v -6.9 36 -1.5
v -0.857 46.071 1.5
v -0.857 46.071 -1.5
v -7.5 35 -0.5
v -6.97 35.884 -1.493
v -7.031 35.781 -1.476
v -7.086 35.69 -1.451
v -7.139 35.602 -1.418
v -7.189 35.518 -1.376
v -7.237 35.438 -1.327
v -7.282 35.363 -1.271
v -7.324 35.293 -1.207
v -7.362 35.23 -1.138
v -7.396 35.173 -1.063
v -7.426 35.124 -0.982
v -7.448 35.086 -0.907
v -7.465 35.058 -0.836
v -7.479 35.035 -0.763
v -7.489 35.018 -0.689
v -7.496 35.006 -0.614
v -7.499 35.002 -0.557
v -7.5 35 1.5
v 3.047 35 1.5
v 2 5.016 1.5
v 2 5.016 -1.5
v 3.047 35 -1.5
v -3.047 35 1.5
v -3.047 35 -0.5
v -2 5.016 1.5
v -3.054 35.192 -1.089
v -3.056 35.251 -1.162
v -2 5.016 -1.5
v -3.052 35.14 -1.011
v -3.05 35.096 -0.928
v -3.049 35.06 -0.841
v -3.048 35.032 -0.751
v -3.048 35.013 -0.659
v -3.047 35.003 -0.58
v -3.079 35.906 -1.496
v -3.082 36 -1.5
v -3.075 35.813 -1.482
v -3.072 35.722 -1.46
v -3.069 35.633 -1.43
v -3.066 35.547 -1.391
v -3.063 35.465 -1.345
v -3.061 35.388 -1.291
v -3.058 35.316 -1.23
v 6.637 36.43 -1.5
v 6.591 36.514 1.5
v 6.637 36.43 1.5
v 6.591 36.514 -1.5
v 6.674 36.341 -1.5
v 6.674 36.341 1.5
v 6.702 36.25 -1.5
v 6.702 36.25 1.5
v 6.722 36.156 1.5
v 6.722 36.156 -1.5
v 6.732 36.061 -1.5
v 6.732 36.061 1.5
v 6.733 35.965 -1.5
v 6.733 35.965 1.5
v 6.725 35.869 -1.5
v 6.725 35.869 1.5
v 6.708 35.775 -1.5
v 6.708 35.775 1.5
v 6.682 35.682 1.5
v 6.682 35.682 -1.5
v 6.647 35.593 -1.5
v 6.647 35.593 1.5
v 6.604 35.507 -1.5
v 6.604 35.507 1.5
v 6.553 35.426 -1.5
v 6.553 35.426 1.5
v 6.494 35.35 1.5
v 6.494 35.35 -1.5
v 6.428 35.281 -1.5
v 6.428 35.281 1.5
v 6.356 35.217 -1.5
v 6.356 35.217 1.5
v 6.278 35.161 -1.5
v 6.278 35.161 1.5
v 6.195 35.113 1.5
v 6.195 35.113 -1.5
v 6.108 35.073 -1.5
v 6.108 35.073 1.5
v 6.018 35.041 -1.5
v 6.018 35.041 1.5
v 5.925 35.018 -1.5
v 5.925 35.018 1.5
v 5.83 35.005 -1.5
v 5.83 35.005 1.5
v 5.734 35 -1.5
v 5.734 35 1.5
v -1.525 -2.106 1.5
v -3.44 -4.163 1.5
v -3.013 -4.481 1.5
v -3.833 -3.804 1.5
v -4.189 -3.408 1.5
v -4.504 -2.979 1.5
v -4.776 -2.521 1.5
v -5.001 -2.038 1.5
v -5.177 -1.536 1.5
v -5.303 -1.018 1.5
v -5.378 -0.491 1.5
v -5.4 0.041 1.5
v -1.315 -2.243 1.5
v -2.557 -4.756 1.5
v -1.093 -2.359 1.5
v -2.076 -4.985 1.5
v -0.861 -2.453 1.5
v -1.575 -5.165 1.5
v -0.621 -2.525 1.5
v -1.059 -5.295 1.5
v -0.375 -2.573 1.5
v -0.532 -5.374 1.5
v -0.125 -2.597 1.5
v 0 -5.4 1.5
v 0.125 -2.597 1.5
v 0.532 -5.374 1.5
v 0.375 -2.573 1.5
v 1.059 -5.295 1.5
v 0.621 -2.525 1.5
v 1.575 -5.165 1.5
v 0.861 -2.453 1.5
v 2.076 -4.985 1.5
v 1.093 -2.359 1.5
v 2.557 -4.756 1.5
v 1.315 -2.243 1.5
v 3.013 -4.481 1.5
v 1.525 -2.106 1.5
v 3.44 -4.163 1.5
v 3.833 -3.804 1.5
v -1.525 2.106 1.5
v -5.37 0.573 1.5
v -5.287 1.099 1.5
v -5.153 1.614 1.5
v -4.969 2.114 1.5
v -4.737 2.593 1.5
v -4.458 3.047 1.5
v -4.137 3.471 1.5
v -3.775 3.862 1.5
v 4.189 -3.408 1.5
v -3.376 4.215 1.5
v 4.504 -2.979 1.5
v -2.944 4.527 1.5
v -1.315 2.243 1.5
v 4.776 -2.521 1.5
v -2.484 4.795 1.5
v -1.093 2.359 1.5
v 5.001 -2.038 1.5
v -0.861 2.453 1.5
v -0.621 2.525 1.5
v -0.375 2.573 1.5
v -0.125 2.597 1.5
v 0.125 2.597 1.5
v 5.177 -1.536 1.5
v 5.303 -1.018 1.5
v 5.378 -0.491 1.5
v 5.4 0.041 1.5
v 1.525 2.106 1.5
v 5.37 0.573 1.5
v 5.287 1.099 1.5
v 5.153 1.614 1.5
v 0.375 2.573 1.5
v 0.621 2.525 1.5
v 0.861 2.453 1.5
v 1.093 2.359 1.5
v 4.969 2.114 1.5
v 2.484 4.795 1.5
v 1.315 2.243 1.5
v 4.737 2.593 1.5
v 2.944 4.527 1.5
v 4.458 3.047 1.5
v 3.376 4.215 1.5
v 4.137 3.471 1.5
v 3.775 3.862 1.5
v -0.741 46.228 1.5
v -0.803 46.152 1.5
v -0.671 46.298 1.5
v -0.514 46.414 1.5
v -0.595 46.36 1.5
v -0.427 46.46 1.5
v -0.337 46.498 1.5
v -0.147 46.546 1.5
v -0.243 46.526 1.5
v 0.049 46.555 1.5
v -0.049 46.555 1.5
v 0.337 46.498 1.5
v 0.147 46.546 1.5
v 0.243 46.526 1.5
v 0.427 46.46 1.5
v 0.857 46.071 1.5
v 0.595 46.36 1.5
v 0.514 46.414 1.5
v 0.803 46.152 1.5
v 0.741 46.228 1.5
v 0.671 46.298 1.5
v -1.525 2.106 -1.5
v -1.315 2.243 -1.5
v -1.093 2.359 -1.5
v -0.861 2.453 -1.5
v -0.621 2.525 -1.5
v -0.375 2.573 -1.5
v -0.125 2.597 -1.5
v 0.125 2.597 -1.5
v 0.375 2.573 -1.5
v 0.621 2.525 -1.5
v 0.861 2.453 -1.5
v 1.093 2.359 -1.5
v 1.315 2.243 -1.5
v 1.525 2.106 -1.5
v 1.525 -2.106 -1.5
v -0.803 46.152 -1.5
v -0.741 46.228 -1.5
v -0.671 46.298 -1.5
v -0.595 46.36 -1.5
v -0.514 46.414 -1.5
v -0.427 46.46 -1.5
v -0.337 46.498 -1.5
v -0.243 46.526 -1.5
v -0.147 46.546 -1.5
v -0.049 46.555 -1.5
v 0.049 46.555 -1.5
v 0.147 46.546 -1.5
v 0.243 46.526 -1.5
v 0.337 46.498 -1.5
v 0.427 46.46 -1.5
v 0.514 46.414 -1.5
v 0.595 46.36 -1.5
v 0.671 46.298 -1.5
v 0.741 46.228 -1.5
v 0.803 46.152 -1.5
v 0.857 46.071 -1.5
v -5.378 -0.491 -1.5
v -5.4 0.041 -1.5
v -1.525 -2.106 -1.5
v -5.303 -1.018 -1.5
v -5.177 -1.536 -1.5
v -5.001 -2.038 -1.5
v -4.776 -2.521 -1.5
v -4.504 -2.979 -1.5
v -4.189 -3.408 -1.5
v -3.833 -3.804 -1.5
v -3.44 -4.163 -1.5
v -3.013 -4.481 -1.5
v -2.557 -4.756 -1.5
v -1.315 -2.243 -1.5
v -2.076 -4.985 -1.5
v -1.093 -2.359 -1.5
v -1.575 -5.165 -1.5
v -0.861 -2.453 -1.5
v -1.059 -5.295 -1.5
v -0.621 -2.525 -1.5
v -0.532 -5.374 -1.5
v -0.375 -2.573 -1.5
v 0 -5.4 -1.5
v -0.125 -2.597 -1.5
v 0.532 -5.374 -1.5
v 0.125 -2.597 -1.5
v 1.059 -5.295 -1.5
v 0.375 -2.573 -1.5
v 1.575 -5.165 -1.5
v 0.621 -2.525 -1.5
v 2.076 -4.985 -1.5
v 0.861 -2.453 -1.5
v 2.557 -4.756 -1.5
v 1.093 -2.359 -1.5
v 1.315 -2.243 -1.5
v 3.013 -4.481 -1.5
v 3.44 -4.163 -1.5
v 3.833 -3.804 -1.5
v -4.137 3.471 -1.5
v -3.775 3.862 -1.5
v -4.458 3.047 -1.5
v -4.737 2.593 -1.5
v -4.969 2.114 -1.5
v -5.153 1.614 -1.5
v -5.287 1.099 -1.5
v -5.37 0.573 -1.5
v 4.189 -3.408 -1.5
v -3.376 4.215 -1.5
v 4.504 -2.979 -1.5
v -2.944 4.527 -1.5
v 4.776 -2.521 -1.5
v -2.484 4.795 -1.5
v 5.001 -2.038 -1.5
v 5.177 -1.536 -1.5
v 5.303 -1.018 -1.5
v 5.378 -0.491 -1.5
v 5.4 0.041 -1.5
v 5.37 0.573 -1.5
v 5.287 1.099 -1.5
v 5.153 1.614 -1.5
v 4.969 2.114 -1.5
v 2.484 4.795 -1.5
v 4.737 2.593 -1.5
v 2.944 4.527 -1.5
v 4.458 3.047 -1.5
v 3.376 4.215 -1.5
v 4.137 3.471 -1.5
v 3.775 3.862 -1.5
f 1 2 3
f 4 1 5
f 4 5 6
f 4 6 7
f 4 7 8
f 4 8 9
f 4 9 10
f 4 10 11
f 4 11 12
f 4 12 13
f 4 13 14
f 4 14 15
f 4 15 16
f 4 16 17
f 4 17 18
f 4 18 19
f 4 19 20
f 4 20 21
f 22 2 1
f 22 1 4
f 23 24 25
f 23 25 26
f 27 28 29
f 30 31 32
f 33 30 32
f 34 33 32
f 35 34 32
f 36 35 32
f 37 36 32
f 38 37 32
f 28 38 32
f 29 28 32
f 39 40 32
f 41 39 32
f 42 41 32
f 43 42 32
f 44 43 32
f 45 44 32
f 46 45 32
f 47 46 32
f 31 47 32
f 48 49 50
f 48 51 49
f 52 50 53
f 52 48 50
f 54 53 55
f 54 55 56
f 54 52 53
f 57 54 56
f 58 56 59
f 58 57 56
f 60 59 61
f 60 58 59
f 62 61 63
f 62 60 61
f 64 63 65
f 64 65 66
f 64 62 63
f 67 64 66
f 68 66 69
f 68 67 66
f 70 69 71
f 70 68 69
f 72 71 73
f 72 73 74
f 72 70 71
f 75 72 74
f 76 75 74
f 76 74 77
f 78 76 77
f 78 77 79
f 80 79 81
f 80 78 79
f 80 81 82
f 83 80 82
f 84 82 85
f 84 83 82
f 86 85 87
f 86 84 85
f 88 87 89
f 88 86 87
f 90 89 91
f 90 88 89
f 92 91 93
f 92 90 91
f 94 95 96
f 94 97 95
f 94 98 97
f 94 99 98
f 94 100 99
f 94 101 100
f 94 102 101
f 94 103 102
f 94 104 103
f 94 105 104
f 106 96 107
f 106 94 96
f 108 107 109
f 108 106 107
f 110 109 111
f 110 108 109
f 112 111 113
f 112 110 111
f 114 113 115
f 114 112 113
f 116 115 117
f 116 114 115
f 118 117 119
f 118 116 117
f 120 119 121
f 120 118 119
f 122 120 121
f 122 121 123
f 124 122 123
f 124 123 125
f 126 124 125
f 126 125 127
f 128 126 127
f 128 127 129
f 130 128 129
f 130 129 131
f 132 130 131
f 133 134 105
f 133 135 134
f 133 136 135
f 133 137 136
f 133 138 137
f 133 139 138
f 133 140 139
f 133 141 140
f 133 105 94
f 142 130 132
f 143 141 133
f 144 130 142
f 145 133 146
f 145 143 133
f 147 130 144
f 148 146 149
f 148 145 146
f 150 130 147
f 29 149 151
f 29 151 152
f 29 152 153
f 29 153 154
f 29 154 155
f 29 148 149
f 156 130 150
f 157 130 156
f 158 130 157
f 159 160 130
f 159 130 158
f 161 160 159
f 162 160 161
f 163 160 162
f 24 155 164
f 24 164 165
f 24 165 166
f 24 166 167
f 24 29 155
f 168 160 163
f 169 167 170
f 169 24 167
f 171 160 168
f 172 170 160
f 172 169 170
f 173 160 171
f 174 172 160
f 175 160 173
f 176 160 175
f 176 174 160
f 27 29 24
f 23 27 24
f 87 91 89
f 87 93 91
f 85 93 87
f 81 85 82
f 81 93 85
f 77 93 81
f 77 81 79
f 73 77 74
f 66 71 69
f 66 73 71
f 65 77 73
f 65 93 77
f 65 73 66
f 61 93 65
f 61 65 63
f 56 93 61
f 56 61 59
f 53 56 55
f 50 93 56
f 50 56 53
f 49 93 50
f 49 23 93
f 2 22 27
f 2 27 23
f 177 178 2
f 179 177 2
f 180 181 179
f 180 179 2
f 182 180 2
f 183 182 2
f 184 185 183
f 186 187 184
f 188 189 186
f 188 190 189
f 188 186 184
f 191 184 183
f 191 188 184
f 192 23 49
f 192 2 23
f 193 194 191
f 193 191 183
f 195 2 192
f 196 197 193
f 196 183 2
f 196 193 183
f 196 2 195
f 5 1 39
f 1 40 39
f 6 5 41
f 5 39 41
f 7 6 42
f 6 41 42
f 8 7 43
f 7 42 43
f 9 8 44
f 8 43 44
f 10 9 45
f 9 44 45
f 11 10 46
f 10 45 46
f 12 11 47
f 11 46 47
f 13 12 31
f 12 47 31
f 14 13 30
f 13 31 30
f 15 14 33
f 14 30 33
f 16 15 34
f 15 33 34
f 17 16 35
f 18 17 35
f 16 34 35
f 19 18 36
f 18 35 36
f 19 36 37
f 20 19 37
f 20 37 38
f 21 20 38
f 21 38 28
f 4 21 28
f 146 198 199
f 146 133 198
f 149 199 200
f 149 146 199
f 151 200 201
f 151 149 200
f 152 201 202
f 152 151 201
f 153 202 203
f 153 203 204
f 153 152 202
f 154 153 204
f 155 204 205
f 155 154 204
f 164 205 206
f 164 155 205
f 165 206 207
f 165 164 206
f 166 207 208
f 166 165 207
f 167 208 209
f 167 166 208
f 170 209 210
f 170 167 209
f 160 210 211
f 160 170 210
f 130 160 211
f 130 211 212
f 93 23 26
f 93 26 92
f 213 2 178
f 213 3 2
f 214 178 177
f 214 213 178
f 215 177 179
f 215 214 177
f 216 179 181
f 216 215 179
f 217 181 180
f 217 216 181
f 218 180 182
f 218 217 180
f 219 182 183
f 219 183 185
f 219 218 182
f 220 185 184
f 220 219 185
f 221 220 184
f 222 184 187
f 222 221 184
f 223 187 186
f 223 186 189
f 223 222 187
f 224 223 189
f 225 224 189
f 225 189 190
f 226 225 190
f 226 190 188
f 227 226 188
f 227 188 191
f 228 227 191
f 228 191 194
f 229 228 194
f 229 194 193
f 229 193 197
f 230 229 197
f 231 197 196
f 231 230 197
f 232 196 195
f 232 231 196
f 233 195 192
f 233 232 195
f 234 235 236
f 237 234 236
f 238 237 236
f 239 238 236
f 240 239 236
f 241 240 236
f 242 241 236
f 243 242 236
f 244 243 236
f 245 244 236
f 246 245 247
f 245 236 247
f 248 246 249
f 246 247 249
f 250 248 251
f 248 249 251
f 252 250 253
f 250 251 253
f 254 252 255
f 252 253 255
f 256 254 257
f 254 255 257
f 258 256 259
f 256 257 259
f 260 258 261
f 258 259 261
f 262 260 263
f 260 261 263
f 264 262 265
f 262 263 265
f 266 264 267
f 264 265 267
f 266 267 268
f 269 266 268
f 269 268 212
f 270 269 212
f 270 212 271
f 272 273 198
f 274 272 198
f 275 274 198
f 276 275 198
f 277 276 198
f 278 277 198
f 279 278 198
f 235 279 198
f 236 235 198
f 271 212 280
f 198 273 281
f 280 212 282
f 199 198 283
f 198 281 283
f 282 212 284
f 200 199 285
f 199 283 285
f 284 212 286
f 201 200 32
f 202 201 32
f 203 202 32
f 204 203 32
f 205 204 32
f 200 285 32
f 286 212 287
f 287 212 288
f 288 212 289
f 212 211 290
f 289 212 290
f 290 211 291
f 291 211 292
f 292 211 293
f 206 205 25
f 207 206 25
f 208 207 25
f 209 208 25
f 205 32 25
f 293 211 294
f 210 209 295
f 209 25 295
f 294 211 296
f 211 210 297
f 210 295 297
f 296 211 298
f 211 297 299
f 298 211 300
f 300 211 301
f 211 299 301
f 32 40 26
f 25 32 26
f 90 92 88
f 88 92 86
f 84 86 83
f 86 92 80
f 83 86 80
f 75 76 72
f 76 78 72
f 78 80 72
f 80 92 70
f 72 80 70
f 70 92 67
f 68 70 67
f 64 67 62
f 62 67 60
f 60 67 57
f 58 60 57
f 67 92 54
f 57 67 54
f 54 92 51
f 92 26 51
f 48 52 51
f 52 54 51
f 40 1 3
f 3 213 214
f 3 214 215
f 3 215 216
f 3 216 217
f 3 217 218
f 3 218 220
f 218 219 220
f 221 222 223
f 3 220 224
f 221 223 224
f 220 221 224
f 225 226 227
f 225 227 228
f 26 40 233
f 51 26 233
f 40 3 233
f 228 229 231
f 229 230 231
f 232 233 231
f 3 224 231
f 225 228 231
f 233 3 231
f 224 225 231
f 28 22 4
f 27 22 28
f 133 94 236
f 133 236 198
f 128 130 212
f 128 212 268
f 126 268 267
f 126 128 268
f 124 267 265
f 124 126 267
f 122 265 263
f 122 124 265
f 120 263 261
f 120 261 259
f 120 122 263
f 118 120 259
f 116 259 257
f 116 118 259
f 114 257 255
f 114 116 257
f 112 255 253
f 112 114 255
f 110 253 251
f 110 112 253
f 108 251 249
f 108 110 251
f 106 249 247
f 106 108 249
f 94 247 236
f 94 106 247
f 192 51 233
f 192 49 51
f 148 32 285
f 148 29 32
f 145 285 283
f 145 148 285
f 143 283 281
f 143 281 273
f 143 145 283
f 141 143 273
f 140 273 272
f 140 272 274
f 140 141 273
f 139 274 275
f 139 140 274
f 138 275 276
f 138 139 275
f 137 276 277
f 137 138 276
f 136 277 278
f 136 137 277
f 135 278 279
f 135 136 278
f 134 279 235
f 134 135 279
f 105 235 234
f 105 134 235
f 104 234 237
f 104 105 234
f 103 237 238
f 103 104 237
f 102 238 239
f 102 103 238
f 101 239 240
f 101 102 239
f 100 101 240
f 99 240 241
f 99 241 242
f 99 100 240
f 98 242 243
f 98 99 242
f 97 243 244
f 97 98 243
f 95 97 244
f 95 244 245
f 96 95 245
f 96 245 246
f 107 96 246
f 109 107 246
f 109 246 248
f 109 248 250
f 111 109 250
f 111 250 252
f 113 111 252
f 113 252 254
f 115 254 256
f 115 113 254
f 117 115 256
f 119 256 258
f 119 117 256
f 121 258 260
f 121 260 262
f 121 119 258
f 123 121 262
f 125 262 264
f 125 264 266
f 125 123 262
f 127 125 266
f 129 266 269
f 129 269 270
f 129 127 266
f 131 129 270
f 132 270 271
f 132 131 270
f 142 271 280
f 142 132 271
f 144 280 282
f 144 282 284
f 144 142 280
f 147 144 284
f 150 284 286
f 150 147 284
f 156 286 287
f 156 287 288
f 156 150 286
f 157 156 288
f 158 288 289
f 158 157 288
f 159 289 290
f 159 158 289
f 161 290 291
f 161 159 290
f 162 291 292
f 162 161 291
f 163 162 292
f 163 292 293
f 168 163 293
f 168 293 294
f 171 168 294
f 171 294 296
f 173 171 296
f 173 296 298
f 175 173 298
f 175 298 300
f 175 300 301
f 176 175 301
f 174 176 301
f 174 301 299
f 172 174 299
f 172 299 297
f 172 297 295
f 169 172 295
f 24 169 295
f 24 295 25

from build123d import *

# Parameters (mm, degrees)
F0_R     = 5.4
F1_DEPTH = 1.5
F3_DEPTH = 1.5
F6_DEPTH = 1.5
F7_R     = 1


with BuildPart() as f1:
    # F0 (on Top) → F1 (new body, symmetric)
    with BuildSketch(Plane.XY):
        Circle(F0_R)
        with BuildLine():
            ThreePointArc((1.525, 2.1057955741), (2.3157072354, 1.1821590418), (2.6, 0))
            ThreePointArc((2.6, 0), (2.3157072354, -1.1821590418), (1.525, -2.1057955741))
            ThreePointArc((1.525, -2.1057955741), (0, -2.6), (-1.525, -2.1057955741))
            ThreePointArc((-1.525, -2.1057955741), (-2.6, 0), (-1.525, 2.1057955741))
            ThreePointArc((-1.525, 2.1057955741), (0, 2.6), (1.525, 2.1057955741))
        make_face(mode=Mode.SUBTRACT)
        with BuildLine():
            Line((-1.525, -2.1057955741), (-1.525, 2.1057955741))
            ThreePointArc((-1.525, 2.1057955741), (-2.6, 0), (-1.525, -2.1057955741))
        make_face()
        with BuildLine():
            ThreePointArc((1.525, -2.1057955741), (2.3157072354, -1.1821590418), (2.6, 0))
            ThreePointArc((2.6, 0), (2.3157072354, 1.1821590418), (1.525, 2.1057955741))
            Line((1.525, 2.1057955741), (1.525, -2.1057955741))
        make_face()
    extrude(amount=F1_DEPTH, both=True)

    # F2 (on face) → F3 (join, through all)
    with BuildSketch(Plane.XY.offset(1.5)):
        with BuildLine():
            Line((3.0470652436, 35), (0, 35))
            Line((0, 35), (-3.0470652436, 35))
            Line((-3.0470652436, 35), (-2, 5.0159744816))
            ThreePointArc((-2, 5.0159744816), (0, 5.4), (2, 5.0159744816))
            Line((2, 5.0159744816), (3.0470652436, 35))
        make_face()
    extrude(amount=-F3_DEPTH)

    # F4: F1 across face


with BuildPart() as f1_1:
    add(f1.part)
    add(f1.part.mirror(Plane(origin=(0, 21.1536915462, 0), x_dir=(1, 0, 0), z_dir=(0, 0, -1))))

    # F5 (on Top) → F6 (join, symmetric)
    with BuildSketch(Plane.XY):
        Polygon((0, 47.5), (-7.5, 35), (7.5, 35), align=None)
    extrude(amount=F6_DEPTH, both=True)

    # F7 (call 1 of 3: OpenCascade refuses the feature's edges together)
    f7_edges = [f1_1.edges().sort_by_distance(p)[0] for p in [
        (0, 47.5, 0),
    ]]
    fillet(f7_edges, radius=F7_R)

    # F7#2 (call 2 of 3)
    f7_2_edges = [f1_1.edges().sort_by_distance(p)[0] for p in [
        (7.5, 35, 0),
    ]]
    fillet(f7_2_edges, radius=F7_R)

    # F7#3 (call 3 of 3)
    f7_3_edges = [f1_1.edges().sort_by_distance(p)[0] for p in [
        (-5.273533, 35, -1.5),
    ]]
    fillet(f7_3_edges, radius=F7_R)


solid = f1_1.part
